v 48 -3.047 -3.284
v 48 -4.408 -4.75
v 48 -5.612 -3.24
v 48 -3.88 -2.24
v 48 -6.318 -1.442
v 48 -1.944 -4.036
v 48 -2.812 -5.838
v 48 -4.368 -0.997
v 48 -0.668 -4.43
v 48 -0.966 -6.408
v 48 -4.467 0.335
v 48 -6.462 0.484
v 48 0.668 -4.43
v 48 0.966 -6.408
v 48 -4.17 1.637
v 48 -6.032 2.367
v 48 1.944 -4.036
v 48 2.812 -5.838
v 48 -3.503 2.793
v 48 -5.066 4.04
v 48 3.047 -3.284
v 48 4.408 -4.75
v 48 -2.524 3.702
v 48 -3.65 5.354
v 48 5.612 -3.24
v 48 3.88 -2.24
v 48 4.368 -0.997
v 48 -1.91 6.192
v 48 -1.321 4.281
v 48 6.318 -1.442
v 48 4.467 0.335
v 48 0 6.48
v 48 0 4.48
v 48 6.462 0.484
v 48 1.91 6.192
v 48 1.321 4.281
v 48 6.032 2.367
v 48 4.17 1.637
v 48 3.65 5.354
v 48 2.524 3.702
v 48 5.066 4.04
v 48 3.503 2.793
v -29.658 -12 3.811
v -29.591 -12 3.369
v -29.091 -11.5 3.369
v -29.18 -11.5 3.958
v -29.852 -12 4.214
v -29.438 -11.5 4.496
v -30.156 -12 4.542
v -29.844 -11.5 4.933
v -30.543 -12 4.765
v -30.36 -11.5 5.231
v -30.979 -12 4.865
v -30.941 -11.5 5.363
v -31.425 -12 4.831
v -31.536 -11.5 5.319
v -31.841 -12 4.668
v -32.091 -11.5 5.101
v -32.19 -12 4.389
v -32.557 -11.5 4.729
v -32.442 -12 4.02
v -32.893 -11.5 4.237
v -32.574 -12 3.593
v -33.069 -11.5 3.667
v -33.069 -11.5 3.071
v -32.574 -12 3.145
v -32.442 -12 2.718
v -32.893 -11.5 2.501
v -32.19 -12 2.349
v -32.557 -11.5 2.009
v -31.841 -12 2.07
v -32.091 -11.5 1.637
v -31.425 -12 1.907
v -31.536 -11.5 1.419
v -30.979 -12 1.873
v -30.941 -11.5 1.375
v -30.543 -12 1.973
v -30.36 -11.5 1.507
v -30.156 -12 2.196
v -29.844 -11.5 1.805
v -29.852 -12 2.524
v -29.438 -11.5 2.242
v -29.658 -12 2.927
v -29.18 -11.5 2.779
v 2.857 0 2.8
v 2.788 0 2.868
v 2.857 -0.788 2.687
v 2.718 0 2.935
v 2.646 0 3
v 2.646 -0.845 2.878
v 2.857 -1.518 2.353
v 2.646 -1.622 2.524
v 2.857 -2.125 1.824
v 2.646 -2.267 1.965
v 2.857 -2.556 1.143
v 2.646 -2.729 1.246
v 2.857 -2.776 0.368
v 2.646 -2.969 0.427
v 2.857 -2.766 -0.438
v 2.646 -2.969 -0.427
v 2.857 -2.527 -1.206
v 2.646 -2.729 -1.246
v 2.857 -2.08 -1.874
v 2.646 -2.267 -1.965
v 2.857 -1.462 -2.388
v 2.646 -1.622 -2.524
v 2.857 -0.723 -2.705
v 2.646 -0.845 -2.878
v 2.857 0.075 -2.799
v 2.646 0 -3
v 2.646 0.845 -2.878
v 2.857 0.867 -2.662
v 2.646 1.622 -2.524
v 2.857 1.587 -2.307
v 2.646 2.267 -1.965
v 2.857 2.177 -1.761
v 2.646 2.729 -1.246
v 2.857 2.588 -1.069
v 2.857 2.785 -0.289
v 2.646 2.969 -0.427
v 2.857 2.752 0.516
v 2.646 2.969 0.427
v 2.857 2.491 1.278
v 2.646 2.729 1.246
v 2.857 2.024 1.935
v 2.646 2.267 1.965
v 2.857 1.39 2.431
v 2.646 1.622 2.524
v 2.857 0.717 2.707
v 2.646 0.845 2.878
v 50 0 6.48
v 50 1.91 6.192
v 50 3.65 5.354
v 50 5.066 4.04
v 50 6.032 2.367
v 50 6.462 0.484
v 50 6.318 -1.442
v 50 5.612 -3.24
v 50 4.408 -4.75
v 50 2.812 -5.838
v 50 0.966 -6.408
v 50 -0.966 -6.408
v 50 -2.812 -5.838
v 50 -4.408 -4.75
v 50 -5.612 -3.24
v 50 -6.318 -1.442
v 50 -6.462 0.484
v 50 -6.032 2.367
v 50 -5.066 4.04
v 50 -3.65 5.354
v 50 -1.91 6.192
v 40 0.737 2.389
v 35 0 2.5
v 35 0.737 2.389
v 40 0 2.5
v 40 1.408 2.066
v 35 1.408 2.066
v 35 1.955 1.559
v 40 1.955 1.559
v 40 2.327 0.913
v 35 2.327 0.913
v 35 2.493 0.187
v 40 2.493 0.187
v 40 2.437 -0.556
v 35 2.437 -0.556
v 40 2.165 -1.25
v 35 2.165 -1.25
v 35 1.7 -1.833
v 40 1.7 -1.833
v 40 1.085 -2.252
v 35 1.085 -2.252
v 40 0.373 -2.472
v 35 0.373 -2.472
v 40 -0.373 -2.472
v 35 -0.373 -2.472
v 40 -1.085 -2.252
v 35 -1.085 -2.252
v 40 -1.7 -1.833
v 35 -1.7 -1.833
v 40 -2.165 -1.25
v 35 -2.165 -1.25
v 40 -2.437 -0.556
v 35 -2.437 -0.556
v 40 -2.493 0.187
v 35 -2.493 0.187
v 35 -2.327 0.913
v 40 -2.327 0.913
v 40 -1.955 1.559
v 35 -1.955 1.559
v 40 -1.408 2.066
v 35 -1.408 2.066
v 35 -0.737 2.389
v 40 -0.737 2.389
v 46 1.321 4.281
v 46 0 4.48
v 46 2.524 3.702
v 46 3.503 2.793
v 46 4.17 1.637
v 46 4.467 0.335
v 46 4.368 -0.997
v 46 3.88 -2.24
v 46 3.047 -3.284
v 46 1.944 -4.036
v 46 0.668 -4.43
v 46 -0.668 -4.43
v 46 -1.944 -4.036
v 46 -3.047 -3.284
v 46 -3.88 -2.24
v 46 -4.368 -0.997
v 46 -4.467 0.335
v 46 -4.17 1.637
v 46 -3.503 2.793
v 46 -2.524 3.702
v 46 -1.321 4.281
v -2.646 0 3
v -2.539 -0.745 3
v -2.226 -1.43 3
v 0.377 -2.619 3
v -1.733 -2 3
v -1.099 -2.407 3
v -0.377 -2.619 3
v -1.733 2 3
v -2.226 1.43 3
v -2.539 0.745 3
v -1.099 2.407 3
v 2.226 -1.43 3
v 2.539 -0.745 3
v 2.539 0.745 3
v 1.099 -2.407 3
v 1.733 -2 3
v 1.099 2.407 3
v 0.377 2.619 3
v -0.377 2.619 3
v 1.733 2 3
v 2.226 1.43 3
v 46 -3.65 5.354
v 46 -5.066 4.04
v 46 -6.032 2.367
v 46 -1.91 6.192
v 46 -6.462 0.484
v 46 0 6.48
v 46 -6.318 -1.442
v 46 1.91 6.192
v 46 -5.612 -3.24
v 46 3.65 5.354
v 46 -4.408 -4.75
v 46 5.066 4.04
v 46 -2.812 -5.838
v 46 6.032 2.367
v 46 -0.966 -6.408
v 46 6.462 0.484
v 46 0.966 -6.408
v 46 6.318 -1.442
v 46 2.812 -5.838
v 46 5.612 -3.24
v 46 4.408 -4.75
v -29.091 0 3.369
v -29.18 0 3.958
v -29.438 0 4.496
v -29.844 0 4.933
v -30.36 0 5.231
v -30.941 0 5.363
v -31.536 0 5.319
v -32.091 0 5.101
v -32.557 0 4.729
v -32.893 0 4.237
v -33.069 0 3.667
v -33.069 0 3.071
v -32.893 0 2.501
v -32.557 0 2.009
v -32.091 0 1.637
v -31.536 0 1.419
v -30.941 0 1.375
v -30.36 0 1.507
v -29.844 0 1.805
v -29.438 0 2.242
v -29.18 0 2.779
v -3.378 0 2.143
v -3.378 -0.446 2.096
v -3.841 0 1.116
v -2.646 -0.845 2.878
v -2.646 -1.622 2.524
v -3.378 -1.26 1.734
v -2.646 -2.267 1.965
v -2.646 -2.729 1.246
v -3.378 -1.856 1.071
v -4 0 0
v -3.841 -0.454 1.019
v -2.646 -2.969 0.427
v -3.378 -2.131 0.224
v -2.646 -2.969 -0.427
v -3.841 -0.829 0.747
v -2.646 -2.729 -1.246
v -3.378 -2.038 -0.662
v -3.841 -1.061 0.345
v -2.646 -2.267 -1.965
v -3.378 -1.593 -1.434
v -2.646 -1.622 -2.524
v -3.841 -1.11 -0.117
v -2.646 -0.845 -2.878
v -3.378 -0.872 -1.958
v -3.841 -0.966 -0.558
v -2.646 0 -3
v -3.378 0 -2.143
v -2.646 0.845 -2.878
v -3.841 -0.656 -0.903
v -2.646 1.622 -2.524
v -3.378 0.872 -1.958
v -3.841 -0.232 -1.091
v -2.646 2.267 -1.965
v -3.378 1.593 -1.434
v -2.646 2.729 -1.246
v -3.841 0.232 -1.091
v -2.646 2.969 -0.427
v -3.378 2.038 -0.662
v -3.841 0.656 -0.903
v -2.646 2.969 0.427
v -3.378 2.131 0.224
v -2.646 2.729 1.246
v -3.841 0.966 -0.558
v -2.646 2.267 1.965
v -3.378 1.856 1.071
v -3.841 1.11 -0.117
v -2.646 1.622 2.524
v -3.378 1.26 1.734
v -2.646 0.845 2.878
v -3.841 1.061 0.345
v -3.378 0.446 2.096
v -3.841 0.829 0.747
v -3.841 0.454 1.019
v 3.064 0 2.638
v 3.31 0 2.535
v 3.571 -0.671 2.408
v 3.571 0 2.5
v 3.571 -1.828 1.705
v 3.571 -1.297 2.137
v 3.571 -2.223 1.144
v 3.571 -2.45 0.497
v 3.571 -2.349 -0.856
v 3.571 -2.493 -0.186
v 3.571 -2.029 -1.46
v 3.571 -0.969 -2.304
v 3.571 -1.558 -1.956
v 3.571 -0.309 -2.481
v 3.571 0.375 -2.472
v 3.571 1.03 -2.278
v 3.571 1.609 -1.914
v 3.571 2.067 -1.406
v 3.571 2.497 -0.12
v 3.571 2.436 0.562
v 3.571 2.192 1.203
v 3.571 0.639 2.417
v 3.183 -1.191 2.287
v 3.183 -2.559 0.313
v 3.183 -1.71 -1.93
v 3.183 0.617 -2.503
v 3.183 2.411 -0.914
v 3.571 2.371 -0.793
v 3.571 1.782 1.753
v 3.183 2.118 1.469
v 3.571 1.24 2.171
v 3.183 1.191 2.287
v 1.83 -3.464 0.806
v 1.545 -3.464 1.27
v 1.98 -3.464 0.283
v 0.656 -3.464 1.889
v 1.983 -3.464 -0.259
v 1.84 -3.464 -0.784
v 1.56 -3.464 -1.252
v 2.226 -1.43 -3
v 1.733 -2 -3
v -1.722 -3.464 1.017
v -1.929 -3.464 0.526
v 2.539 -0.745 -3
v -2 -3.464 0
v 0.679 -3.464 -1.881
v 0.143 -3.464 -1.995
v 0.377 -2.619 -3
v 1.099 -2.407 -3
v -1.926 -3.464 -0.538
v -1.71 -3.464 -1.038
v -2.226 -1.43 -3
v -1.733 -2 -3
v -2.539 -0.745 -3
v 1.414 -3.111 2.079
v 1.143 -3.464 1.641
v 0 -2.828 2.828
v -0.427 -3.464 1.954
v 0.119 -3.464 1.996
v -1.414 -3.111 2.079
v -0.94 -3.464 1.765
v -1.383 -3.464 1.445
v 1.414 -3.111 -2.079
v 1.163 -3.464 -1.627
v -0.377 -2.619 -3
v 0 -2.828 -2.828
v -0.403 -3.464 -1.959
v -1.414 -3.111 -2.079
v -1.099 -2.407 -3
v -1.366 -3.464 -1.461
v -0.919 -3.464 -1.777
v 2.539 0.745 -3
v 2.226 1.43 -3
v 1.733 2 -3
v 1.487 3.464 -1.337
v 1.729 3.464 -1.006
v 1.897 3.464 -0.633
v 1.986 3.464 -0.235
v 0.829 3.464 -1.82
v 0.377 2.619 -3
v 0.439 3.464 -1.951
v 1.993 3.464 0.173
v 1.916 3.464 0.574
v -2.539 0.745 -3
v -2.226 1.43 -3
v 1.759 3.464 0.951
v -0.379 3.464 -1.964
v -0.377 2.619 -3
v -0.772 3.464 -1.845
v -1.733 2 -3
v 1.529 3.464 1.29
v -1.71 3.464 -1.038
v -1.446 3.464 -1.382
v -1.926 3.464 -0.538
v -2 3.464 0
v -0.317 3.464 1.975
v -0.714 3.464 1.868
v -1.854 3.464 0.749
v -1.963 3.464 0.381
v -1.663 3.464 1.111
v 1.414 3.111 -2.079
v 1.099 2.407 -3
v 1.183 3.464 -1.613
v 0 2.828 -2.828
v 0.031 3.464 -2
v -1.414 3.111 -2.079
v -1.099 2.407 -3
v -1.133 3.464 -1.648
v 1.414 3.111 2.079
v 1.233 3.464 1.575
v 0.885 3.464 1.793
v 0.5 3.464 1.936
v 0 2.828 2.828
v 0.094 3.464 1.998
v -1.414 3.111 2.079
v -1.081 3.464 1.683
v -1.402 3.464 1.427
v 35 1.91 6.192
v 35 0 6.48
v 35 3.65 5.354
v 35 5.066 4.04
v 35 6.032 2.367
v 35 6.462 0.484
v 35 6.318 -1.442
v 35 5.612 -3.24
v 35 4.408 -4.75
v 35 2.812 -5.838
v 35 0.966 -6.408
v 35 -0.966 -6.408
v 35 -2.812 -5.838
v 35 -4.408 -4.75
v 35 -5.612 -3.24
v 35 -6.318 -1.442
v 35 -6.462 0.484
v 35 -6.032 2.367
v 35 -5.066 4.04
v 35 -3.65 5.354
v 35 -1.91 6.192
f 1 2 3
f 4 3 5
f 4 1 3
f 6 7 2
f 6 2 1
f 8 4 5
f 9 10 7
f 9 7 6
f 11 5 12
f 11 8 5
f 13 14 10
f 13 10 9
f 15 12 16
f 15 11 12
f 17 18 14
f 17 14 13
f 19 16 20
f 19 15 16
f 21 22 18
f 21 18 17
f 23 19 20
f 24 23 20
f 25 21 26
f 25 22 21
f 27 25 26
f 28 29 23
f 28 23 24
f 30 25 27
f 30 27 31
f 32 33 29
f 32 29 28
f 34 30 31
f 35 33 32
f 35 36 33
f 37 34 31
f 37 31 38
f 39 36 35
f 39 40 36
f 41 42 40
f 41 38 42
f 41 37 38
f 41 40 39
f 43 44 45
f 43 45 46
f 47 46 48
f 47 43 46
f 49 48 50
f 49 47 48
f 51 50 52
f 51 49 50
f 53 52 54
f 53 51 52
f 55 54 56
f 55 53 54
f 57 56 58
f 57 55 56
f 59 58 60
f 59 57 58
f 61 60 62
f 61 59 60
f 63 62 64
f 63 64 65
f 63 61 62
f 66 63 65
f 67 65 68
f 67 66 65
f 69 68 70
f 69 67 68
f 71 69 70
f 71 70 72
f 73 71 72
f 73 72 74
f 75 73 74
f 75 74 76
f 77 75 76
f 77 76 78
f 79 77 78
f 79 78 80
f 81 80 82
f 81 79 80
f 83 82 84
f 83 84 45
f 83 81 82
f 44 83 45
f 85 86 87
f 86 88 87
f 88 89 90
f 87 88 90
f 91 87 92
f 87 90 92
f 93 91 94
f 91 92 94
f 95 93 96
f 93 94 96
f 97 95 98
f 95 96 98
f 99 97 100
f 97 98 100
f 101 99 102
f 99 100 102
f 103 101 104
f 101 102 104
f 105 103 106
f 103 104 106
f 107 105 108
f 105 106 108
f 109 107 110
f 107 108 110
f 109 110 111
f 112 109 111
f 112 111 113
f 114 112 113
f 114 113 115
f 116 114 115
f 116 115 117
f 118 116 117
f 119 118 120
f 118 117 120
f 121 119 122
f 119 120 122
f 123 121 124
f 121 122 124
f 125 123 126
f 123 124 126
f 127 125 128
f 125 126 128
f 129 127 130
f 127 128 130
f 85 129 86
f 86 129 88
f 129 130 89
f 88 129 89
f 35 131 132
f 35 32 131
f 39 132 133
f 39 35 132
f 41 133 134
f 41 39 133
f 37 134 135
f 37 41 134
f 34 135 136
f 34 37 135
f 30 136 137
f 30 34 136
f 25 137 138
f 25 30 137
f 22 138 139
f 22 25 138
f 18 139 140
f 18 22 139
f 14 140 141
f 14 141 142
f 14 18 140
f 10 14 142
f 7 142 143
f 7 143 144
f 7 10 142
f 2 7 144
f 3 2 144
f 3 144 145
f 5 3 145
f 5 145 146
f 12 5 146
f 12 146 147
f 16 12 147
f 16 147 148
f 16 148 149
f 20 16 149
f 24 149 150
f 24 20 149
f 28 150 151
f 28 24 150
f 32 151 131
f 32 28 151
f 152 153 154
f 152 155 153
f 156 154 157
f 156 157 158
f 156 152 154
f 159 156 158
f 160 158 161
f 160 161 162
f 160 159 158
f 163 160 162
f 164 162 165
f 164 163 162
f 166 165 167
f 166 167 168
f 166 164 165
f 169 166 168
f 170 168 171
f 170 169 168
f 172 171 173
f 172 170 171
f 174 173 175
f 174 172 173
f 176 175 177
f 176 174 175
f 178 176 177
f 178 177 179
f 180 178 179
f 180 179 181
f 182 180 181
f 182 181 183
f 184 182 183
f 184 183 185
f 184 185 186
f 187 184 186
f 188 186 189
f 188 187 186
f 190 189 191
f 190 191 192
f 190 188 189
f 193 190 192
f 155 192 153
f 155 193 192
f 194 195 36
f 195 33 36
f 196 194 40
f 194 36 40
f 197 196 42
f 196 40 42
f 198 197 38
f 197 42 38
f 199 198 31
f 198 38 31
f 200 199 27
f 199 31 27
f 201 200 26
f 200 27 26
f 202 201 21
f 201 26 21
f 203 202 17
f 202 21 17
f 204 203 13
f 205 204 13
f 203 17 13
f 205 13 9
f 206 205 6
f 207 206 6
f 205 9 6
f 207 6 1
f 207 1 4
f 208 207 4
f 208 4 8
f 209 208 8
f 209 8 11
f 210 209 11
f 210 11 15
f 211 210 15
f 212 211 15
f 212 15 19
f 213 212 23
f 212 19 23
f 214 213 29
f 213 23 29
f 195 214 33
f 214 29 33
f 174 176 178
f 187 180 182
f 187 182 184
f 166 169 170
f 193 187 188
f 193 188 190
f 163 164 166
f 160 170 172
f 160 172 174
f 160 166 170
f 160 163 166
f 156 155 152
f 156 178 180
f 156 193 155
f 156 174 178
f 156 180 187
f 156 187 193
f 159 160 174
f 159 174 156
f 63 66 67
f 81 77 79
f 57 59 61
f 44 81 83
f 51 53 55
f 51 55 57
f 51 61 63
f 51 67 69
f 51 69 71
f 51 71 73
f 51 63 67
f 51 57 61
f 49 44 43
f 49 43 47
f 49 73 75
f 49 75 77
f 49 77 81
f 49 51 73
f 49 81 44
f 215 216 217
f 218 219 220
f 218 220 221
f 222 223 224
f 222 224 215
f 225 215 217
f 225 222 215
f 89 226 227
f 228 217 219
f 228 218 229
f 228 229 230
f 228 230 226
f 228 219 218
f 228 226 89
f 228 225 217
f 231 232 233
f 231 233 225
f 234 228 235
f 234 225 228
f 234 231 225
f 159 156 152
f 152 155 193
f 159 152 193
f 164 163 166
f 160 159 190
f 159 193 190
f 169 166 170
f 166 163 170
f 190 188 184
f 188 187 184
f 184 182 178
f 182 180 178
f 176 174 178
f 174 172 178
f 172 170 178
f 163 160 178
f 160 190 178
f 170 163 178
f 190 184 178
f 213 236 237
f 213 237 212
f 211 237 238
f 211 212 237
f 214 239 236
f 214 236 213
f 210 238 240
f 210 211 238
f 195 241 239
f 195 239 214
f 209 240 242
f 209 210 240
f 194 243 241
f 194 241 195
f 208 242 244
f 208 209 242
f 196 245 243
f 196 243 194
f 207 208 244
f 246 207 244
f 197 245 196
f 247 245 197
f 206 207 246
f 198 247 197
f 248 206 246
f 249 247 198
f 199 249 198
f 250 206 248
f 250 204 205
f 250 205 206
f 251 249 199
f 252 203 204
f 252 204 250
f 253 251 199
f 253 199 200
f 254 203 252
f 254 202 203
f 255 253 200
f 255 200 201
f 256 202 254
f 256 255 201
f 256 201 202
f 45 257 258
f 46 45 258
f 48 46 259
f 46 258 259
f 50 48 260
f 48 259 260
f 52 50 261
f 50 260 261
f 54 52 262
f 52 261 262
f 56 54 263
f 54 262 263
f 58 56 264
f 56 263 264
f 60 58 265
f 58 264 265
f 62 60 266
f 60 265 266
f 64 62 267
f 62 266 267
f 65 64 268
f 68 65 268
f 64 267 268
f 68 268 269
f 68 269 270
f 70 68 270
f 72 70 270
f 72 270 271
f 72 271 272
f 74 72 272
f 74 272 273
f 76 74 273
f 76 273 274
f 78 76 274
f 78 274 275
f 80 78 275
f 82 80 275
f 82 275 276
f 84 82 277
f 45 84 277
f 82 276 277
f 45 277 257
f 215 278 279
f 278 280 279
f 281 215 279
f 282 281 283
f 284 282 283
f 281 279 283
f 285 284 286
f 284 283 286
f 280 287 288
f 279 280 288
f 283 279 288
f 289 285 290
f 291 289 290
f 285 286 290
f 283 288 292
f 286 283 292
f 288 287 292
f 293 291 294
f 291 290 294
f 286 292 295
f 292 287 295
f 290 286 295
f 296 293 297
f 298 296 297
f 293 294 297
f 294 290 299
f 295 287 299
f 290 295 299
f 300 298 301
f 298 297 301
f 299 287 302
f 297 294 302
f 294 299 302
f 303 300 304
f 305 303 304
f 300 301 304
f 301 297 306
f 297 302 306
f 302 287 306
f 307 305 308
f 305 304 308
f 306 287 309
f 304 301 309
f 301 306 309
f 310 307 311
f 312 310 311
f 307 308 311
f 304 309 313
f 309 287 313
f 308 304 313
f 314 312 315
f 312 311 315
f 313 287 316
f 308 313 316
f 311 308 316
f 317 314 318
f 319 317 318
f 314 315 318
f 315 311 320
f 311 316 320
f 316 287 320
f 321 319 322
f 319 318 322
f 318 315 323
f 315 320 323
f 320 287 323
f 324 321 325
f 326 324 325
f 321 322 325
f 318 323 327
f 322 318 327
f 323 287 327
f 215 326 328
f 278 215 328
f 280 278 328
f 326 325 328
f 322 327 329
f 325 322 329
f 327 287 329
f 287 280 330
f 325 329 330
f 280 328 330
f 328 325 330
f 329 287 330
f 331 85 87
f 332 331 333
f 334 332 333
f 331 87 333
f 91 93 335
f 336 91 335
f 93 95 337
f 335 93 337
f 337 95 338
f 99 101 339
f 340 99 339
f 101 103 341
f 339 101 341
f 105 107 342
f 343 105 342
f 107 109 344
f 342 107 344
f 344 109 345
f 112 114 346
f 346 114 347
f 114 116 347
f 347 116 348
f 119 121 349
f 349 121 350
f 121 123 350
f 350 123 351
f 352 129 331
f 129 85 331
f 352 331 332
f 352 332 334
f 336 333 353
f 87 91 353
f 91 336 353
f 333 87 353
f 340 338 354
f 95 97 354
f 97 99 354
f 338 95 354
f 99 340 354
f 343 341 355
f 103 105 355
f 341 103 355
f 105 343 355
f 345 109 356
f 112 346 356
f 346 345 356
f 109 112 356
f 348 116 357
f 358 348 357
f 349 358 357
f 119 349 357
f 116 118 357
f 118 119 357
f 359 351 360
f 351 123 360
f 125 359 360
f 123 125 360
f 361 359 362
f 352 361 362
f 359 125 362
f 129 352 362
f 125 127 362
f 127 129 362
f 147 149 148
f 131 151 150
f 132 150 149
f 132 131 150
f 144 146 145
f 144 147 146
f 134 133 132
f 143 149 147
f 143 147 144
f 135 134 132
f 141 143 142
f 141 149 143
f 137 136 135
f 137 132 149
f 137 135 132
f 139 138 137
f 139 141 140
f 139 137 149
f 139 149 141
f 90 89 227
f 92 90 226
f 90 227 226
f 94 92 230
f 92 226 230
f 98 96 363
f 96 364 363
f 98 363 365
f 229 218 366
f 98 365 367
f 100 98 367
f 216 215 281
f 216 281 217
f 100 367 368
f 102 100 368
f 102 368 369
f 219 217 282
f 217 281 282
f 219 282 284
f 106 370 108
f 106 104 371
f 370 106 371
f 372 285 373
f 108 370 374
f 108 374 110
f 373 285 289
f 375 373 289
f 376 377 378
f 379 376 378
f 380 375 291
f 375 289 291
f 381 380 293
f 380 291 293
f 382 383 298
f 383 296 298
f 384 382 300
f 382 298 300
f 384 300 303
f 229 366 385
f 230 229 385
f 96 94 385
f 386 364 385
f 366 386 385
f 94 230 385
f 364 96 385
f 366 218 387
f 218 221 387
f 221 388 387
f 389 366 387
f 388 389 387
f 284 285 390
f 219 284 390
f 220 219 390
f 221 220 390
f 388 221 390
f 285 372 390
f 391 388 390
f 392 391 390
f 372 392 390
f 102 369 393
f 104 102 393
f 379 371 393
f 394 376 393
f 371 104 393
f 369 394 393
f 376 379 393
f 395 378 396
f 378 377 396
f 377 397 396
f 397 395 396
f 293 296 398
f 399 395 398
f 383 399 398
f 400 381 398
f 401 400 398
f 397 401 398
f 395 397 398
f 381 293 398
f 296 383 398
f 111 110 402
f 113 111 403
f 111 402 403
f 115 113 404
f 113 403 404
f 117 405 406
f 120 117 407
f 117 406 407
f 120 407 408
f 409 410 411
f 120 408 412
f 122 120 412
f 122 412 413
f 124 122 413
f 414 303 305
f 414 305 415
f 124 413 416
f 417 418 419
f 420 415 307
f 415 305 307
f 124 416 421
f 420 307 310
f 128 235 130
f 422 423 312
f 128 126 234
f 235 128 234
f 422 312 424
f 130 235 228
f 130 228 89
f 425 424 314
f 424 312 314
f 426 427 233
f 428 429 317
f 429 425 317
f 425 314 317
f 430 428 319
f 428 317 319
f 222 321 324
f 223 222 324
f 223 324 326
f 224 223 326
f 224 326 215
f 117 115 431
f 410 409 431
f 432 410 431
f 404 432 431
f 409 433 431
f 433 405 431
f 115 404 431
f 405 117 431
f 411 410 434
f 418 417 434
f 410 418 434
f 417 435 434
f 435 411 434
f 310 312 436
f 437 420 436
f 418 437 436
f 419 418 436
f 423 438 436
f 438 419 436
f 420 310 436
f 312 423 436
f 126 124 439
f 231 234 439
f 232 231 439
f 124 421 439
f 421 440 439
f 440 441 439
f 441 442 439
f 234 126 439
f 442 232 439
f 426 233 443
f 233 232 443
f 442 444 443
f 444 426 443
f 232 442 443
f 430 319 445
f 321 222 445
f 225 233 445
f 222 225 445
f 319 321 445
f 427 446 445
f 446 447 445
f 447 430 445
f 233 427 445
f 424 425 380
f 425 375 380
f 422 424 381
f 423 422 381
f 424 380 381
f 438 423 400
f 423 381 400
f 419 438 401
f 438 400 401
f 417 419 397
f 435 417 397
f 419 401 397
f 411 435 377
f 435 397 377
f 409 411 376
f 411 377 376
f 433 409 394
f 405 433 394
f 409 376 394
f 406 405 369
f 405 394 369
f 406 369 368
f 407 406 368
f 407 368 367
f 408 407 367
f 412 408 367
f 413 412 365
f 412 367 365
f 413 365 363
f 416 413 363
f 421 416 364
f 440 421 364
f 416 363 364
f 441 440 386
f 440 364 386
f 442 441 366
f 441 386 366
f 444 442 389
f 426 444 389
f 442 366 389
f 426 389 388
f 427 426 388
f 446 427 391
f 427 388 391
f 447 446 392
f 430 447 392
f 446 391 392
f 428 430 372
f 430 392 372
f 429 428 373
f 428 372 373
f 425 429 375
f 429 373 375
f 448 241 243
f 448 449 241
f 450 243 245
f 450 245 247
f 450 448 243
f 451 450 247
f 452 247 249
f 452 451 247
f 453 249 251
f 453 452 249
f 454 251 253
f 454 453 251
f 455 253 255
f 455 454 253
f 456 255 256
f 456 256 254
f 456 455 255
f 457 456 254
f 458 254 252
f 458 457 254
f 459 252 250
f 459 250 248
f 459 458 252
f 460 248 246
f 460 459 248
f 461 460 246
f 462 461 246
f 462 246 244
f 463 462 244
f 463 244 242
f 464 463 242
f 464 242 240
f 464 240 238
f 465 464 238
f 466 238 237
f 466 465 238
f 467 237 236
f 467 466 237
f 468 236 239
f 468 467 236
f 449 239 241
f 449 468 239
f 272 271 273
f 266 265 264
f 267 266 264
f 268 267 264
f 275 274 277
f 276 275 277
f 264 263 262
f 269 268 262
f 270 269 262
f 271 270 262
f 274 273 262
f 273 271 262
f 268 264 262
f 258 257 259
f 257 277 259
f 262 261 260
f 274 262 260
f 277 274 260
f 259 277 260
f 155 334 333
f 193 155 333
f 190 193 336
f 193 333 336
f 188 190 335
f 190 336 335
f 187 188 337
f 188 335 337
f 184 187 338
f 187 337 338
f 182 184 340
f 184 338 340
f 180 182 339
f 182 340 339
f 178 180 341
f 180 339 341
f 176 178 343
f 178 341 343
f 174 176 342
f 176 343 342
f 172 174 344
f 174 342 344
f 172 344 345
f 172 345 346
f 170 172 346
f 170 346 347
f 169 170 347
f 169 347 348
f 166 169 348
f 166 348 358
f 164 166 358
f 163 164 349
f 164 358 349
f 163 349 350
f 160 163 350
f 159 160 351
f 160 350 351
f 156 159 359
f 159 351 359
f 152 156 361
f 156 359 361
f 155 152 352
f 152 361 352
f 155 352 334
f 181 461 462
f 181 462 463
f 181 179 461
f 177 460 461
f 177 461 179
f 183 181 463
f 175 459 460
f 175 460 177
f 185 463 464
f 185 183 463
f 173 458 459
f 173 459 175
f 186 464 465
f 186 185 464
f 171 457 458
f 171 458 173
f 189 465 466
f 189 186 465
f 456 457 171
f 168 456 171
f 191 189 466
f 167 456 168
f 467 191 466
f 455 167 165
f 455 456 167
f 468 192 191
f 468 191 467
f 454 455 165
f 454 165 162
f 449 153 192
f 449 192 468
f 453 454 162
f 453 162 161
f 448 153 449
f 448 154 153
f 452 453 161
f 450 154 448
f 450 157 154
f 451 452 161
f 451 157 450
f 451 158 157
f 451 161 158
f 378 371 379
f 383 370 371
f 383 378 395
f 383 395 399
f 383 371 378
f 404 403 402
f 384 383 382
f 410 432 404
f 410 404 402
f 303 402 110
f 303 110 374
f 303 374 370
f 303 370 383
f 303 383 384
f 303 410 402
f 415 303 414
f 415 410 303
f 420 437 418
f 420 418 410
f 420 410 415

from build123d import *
from build123d import SkipClean  # not in build123d's __all__

# Parameters (mm, degrees)
F0_W     = 5
F0_H     = 2.5
F2_DEPTH = 12.5
F3_R     = 1
F4_W     = 2
F4_H     = 4.48
F0_R     = 2
F6_DEPTH = 12
F7_SIZE  = 0.5


with BuildPart() as f1:
    # F0 (on Front) → F1 (revolve)
    with BuildSketch(Plane.XZ):
        with BuildLine():
            ThreePointArc((2.6457513111, 3), (0, 4), (-2.6457513111, 3))
            Line((-2.6457513111, 3), (2.6457513111, 3))
        make_face()
        with BuildLine():
            ThreePointArc((-2, 0), (0, 2), (2, 0))
            Line((2, 0), (4, 0))
            ThreePointArc((4, 0), (3.7742546282, 1.3247648854), (3.1224989992, 2.5))
            ThreePointArc((3.1224989992, 2.5), (2.894940053, 2.7603119551), (2.6457513111, 3))
            Line((2.6457513111, 3), (-2.6457513111, 3))
            ThreePointArc((-2.6457513111, 3), (-3.6457513111, 1.6457513111), (-4, 0))
            Line((-4, 0), (-2, 0))
        make_face()
        with BuildLine():
            ThreePointArc((3.1224989992, 2.5), (3.7742546282, 1.3247648854), (4, 0))
            Line((4, 0), (35, 0))
            Line((35, 0), (35, 2.5))
            Line((35, 2.5), (3.1224989992, 2.5))
        make_face()
        with BuildLine():
            Line((-2, 0), (0, 0))
            Line((0, 0), (2, 0))
            ThreePointArc((2, 0), (0, 2), (-2, 0))
        make_face()
        with Locations((37.5, 1.25)):
            Rectangle(F0_W, F0_H)
    revolve(axis=Axis((25.0713285059, 0, 0), (1, 0, 0)))

    # F0 (on Front) → F2 (cut, symmetric)
    with BuildSketch(Plane.XZ):
        with BuildLine():
            ThreePointArc((2.6457513111, 3), (0, 4), (-2.6457513111, 3))
            Line((-2.6457513111, 3), (2.6457513111, 3))
        make_face()
        with BuildLine():
            Line((2.6457513111, -3), (-2.6457513111, -3))
            ThreePointArc((-2.6457513111, -3), (0, -4), (2.6457513111, -3))
        make_face()
        with BuildLine():
            Line((-2, 0), (0, 0))
            Line((0, 0), (2, 0))
            ThreePointArc((2, 0), (0, 2), (-2, 0))
        make_face()
        with BuildLine():
            Line((2, 0), (0, 0))
            Line((0, 0), (-2, 0))
            ThreePointArc((-2, 0), (0, -2), (2, 0))
        make_face()
    with SkipClean():  # cleaning this boolean's faces spoils the solid; the shape is the same uncleaned
        extrude(amount=F2_DEPTH, both=True, mode=Mode.SUBTRACT)

    # F3
    f3_edges = [f1.edges().sort_by_distance(p)[0] for p in [
        (3.122499, 0, -2.5),
    ]]
    fillet(f3_edges, radius=F3_R)


with BuildPart() as f5:
    # F4 (on Front) → F5 (revolve)
    with BuildSketch(Plane.XZ):
        Polygon((50, 6.48), (48, 6.48), (48, 4.48), (48, 0), (50, 0), align=None)
        with Locations((47, 2.24)):
            Rectangle(F4_W, F4_H)
        Polygon((35, 6.48), (35, 2.5), (40, 2.5), (40, 0), (46, 0), (46, 4.48), (46, 6.48), align=None)
    revolve(axis=Axis((42.5, 0, 0), (-1, 0, 0)))


with BuildPart() as f6:
    # F0 (on Front) → F6 (new body)
    with BuildSketch(Plane.XZ):
        with Locations((-31.0908816755, 3.3689432312)):
            Circle(F0_R)
    extrude(amount=F6_DEPTH)

    # F7
    f7_edges = [f6.edges().sort_by_distance(p)[0] for p in [
        (-33.090882, -12, 3.368943),
    ]]
    chamfer(f7_edges, length=F7_SIZE)


solid = Compound([f1.part, f5.part, f6.part])
